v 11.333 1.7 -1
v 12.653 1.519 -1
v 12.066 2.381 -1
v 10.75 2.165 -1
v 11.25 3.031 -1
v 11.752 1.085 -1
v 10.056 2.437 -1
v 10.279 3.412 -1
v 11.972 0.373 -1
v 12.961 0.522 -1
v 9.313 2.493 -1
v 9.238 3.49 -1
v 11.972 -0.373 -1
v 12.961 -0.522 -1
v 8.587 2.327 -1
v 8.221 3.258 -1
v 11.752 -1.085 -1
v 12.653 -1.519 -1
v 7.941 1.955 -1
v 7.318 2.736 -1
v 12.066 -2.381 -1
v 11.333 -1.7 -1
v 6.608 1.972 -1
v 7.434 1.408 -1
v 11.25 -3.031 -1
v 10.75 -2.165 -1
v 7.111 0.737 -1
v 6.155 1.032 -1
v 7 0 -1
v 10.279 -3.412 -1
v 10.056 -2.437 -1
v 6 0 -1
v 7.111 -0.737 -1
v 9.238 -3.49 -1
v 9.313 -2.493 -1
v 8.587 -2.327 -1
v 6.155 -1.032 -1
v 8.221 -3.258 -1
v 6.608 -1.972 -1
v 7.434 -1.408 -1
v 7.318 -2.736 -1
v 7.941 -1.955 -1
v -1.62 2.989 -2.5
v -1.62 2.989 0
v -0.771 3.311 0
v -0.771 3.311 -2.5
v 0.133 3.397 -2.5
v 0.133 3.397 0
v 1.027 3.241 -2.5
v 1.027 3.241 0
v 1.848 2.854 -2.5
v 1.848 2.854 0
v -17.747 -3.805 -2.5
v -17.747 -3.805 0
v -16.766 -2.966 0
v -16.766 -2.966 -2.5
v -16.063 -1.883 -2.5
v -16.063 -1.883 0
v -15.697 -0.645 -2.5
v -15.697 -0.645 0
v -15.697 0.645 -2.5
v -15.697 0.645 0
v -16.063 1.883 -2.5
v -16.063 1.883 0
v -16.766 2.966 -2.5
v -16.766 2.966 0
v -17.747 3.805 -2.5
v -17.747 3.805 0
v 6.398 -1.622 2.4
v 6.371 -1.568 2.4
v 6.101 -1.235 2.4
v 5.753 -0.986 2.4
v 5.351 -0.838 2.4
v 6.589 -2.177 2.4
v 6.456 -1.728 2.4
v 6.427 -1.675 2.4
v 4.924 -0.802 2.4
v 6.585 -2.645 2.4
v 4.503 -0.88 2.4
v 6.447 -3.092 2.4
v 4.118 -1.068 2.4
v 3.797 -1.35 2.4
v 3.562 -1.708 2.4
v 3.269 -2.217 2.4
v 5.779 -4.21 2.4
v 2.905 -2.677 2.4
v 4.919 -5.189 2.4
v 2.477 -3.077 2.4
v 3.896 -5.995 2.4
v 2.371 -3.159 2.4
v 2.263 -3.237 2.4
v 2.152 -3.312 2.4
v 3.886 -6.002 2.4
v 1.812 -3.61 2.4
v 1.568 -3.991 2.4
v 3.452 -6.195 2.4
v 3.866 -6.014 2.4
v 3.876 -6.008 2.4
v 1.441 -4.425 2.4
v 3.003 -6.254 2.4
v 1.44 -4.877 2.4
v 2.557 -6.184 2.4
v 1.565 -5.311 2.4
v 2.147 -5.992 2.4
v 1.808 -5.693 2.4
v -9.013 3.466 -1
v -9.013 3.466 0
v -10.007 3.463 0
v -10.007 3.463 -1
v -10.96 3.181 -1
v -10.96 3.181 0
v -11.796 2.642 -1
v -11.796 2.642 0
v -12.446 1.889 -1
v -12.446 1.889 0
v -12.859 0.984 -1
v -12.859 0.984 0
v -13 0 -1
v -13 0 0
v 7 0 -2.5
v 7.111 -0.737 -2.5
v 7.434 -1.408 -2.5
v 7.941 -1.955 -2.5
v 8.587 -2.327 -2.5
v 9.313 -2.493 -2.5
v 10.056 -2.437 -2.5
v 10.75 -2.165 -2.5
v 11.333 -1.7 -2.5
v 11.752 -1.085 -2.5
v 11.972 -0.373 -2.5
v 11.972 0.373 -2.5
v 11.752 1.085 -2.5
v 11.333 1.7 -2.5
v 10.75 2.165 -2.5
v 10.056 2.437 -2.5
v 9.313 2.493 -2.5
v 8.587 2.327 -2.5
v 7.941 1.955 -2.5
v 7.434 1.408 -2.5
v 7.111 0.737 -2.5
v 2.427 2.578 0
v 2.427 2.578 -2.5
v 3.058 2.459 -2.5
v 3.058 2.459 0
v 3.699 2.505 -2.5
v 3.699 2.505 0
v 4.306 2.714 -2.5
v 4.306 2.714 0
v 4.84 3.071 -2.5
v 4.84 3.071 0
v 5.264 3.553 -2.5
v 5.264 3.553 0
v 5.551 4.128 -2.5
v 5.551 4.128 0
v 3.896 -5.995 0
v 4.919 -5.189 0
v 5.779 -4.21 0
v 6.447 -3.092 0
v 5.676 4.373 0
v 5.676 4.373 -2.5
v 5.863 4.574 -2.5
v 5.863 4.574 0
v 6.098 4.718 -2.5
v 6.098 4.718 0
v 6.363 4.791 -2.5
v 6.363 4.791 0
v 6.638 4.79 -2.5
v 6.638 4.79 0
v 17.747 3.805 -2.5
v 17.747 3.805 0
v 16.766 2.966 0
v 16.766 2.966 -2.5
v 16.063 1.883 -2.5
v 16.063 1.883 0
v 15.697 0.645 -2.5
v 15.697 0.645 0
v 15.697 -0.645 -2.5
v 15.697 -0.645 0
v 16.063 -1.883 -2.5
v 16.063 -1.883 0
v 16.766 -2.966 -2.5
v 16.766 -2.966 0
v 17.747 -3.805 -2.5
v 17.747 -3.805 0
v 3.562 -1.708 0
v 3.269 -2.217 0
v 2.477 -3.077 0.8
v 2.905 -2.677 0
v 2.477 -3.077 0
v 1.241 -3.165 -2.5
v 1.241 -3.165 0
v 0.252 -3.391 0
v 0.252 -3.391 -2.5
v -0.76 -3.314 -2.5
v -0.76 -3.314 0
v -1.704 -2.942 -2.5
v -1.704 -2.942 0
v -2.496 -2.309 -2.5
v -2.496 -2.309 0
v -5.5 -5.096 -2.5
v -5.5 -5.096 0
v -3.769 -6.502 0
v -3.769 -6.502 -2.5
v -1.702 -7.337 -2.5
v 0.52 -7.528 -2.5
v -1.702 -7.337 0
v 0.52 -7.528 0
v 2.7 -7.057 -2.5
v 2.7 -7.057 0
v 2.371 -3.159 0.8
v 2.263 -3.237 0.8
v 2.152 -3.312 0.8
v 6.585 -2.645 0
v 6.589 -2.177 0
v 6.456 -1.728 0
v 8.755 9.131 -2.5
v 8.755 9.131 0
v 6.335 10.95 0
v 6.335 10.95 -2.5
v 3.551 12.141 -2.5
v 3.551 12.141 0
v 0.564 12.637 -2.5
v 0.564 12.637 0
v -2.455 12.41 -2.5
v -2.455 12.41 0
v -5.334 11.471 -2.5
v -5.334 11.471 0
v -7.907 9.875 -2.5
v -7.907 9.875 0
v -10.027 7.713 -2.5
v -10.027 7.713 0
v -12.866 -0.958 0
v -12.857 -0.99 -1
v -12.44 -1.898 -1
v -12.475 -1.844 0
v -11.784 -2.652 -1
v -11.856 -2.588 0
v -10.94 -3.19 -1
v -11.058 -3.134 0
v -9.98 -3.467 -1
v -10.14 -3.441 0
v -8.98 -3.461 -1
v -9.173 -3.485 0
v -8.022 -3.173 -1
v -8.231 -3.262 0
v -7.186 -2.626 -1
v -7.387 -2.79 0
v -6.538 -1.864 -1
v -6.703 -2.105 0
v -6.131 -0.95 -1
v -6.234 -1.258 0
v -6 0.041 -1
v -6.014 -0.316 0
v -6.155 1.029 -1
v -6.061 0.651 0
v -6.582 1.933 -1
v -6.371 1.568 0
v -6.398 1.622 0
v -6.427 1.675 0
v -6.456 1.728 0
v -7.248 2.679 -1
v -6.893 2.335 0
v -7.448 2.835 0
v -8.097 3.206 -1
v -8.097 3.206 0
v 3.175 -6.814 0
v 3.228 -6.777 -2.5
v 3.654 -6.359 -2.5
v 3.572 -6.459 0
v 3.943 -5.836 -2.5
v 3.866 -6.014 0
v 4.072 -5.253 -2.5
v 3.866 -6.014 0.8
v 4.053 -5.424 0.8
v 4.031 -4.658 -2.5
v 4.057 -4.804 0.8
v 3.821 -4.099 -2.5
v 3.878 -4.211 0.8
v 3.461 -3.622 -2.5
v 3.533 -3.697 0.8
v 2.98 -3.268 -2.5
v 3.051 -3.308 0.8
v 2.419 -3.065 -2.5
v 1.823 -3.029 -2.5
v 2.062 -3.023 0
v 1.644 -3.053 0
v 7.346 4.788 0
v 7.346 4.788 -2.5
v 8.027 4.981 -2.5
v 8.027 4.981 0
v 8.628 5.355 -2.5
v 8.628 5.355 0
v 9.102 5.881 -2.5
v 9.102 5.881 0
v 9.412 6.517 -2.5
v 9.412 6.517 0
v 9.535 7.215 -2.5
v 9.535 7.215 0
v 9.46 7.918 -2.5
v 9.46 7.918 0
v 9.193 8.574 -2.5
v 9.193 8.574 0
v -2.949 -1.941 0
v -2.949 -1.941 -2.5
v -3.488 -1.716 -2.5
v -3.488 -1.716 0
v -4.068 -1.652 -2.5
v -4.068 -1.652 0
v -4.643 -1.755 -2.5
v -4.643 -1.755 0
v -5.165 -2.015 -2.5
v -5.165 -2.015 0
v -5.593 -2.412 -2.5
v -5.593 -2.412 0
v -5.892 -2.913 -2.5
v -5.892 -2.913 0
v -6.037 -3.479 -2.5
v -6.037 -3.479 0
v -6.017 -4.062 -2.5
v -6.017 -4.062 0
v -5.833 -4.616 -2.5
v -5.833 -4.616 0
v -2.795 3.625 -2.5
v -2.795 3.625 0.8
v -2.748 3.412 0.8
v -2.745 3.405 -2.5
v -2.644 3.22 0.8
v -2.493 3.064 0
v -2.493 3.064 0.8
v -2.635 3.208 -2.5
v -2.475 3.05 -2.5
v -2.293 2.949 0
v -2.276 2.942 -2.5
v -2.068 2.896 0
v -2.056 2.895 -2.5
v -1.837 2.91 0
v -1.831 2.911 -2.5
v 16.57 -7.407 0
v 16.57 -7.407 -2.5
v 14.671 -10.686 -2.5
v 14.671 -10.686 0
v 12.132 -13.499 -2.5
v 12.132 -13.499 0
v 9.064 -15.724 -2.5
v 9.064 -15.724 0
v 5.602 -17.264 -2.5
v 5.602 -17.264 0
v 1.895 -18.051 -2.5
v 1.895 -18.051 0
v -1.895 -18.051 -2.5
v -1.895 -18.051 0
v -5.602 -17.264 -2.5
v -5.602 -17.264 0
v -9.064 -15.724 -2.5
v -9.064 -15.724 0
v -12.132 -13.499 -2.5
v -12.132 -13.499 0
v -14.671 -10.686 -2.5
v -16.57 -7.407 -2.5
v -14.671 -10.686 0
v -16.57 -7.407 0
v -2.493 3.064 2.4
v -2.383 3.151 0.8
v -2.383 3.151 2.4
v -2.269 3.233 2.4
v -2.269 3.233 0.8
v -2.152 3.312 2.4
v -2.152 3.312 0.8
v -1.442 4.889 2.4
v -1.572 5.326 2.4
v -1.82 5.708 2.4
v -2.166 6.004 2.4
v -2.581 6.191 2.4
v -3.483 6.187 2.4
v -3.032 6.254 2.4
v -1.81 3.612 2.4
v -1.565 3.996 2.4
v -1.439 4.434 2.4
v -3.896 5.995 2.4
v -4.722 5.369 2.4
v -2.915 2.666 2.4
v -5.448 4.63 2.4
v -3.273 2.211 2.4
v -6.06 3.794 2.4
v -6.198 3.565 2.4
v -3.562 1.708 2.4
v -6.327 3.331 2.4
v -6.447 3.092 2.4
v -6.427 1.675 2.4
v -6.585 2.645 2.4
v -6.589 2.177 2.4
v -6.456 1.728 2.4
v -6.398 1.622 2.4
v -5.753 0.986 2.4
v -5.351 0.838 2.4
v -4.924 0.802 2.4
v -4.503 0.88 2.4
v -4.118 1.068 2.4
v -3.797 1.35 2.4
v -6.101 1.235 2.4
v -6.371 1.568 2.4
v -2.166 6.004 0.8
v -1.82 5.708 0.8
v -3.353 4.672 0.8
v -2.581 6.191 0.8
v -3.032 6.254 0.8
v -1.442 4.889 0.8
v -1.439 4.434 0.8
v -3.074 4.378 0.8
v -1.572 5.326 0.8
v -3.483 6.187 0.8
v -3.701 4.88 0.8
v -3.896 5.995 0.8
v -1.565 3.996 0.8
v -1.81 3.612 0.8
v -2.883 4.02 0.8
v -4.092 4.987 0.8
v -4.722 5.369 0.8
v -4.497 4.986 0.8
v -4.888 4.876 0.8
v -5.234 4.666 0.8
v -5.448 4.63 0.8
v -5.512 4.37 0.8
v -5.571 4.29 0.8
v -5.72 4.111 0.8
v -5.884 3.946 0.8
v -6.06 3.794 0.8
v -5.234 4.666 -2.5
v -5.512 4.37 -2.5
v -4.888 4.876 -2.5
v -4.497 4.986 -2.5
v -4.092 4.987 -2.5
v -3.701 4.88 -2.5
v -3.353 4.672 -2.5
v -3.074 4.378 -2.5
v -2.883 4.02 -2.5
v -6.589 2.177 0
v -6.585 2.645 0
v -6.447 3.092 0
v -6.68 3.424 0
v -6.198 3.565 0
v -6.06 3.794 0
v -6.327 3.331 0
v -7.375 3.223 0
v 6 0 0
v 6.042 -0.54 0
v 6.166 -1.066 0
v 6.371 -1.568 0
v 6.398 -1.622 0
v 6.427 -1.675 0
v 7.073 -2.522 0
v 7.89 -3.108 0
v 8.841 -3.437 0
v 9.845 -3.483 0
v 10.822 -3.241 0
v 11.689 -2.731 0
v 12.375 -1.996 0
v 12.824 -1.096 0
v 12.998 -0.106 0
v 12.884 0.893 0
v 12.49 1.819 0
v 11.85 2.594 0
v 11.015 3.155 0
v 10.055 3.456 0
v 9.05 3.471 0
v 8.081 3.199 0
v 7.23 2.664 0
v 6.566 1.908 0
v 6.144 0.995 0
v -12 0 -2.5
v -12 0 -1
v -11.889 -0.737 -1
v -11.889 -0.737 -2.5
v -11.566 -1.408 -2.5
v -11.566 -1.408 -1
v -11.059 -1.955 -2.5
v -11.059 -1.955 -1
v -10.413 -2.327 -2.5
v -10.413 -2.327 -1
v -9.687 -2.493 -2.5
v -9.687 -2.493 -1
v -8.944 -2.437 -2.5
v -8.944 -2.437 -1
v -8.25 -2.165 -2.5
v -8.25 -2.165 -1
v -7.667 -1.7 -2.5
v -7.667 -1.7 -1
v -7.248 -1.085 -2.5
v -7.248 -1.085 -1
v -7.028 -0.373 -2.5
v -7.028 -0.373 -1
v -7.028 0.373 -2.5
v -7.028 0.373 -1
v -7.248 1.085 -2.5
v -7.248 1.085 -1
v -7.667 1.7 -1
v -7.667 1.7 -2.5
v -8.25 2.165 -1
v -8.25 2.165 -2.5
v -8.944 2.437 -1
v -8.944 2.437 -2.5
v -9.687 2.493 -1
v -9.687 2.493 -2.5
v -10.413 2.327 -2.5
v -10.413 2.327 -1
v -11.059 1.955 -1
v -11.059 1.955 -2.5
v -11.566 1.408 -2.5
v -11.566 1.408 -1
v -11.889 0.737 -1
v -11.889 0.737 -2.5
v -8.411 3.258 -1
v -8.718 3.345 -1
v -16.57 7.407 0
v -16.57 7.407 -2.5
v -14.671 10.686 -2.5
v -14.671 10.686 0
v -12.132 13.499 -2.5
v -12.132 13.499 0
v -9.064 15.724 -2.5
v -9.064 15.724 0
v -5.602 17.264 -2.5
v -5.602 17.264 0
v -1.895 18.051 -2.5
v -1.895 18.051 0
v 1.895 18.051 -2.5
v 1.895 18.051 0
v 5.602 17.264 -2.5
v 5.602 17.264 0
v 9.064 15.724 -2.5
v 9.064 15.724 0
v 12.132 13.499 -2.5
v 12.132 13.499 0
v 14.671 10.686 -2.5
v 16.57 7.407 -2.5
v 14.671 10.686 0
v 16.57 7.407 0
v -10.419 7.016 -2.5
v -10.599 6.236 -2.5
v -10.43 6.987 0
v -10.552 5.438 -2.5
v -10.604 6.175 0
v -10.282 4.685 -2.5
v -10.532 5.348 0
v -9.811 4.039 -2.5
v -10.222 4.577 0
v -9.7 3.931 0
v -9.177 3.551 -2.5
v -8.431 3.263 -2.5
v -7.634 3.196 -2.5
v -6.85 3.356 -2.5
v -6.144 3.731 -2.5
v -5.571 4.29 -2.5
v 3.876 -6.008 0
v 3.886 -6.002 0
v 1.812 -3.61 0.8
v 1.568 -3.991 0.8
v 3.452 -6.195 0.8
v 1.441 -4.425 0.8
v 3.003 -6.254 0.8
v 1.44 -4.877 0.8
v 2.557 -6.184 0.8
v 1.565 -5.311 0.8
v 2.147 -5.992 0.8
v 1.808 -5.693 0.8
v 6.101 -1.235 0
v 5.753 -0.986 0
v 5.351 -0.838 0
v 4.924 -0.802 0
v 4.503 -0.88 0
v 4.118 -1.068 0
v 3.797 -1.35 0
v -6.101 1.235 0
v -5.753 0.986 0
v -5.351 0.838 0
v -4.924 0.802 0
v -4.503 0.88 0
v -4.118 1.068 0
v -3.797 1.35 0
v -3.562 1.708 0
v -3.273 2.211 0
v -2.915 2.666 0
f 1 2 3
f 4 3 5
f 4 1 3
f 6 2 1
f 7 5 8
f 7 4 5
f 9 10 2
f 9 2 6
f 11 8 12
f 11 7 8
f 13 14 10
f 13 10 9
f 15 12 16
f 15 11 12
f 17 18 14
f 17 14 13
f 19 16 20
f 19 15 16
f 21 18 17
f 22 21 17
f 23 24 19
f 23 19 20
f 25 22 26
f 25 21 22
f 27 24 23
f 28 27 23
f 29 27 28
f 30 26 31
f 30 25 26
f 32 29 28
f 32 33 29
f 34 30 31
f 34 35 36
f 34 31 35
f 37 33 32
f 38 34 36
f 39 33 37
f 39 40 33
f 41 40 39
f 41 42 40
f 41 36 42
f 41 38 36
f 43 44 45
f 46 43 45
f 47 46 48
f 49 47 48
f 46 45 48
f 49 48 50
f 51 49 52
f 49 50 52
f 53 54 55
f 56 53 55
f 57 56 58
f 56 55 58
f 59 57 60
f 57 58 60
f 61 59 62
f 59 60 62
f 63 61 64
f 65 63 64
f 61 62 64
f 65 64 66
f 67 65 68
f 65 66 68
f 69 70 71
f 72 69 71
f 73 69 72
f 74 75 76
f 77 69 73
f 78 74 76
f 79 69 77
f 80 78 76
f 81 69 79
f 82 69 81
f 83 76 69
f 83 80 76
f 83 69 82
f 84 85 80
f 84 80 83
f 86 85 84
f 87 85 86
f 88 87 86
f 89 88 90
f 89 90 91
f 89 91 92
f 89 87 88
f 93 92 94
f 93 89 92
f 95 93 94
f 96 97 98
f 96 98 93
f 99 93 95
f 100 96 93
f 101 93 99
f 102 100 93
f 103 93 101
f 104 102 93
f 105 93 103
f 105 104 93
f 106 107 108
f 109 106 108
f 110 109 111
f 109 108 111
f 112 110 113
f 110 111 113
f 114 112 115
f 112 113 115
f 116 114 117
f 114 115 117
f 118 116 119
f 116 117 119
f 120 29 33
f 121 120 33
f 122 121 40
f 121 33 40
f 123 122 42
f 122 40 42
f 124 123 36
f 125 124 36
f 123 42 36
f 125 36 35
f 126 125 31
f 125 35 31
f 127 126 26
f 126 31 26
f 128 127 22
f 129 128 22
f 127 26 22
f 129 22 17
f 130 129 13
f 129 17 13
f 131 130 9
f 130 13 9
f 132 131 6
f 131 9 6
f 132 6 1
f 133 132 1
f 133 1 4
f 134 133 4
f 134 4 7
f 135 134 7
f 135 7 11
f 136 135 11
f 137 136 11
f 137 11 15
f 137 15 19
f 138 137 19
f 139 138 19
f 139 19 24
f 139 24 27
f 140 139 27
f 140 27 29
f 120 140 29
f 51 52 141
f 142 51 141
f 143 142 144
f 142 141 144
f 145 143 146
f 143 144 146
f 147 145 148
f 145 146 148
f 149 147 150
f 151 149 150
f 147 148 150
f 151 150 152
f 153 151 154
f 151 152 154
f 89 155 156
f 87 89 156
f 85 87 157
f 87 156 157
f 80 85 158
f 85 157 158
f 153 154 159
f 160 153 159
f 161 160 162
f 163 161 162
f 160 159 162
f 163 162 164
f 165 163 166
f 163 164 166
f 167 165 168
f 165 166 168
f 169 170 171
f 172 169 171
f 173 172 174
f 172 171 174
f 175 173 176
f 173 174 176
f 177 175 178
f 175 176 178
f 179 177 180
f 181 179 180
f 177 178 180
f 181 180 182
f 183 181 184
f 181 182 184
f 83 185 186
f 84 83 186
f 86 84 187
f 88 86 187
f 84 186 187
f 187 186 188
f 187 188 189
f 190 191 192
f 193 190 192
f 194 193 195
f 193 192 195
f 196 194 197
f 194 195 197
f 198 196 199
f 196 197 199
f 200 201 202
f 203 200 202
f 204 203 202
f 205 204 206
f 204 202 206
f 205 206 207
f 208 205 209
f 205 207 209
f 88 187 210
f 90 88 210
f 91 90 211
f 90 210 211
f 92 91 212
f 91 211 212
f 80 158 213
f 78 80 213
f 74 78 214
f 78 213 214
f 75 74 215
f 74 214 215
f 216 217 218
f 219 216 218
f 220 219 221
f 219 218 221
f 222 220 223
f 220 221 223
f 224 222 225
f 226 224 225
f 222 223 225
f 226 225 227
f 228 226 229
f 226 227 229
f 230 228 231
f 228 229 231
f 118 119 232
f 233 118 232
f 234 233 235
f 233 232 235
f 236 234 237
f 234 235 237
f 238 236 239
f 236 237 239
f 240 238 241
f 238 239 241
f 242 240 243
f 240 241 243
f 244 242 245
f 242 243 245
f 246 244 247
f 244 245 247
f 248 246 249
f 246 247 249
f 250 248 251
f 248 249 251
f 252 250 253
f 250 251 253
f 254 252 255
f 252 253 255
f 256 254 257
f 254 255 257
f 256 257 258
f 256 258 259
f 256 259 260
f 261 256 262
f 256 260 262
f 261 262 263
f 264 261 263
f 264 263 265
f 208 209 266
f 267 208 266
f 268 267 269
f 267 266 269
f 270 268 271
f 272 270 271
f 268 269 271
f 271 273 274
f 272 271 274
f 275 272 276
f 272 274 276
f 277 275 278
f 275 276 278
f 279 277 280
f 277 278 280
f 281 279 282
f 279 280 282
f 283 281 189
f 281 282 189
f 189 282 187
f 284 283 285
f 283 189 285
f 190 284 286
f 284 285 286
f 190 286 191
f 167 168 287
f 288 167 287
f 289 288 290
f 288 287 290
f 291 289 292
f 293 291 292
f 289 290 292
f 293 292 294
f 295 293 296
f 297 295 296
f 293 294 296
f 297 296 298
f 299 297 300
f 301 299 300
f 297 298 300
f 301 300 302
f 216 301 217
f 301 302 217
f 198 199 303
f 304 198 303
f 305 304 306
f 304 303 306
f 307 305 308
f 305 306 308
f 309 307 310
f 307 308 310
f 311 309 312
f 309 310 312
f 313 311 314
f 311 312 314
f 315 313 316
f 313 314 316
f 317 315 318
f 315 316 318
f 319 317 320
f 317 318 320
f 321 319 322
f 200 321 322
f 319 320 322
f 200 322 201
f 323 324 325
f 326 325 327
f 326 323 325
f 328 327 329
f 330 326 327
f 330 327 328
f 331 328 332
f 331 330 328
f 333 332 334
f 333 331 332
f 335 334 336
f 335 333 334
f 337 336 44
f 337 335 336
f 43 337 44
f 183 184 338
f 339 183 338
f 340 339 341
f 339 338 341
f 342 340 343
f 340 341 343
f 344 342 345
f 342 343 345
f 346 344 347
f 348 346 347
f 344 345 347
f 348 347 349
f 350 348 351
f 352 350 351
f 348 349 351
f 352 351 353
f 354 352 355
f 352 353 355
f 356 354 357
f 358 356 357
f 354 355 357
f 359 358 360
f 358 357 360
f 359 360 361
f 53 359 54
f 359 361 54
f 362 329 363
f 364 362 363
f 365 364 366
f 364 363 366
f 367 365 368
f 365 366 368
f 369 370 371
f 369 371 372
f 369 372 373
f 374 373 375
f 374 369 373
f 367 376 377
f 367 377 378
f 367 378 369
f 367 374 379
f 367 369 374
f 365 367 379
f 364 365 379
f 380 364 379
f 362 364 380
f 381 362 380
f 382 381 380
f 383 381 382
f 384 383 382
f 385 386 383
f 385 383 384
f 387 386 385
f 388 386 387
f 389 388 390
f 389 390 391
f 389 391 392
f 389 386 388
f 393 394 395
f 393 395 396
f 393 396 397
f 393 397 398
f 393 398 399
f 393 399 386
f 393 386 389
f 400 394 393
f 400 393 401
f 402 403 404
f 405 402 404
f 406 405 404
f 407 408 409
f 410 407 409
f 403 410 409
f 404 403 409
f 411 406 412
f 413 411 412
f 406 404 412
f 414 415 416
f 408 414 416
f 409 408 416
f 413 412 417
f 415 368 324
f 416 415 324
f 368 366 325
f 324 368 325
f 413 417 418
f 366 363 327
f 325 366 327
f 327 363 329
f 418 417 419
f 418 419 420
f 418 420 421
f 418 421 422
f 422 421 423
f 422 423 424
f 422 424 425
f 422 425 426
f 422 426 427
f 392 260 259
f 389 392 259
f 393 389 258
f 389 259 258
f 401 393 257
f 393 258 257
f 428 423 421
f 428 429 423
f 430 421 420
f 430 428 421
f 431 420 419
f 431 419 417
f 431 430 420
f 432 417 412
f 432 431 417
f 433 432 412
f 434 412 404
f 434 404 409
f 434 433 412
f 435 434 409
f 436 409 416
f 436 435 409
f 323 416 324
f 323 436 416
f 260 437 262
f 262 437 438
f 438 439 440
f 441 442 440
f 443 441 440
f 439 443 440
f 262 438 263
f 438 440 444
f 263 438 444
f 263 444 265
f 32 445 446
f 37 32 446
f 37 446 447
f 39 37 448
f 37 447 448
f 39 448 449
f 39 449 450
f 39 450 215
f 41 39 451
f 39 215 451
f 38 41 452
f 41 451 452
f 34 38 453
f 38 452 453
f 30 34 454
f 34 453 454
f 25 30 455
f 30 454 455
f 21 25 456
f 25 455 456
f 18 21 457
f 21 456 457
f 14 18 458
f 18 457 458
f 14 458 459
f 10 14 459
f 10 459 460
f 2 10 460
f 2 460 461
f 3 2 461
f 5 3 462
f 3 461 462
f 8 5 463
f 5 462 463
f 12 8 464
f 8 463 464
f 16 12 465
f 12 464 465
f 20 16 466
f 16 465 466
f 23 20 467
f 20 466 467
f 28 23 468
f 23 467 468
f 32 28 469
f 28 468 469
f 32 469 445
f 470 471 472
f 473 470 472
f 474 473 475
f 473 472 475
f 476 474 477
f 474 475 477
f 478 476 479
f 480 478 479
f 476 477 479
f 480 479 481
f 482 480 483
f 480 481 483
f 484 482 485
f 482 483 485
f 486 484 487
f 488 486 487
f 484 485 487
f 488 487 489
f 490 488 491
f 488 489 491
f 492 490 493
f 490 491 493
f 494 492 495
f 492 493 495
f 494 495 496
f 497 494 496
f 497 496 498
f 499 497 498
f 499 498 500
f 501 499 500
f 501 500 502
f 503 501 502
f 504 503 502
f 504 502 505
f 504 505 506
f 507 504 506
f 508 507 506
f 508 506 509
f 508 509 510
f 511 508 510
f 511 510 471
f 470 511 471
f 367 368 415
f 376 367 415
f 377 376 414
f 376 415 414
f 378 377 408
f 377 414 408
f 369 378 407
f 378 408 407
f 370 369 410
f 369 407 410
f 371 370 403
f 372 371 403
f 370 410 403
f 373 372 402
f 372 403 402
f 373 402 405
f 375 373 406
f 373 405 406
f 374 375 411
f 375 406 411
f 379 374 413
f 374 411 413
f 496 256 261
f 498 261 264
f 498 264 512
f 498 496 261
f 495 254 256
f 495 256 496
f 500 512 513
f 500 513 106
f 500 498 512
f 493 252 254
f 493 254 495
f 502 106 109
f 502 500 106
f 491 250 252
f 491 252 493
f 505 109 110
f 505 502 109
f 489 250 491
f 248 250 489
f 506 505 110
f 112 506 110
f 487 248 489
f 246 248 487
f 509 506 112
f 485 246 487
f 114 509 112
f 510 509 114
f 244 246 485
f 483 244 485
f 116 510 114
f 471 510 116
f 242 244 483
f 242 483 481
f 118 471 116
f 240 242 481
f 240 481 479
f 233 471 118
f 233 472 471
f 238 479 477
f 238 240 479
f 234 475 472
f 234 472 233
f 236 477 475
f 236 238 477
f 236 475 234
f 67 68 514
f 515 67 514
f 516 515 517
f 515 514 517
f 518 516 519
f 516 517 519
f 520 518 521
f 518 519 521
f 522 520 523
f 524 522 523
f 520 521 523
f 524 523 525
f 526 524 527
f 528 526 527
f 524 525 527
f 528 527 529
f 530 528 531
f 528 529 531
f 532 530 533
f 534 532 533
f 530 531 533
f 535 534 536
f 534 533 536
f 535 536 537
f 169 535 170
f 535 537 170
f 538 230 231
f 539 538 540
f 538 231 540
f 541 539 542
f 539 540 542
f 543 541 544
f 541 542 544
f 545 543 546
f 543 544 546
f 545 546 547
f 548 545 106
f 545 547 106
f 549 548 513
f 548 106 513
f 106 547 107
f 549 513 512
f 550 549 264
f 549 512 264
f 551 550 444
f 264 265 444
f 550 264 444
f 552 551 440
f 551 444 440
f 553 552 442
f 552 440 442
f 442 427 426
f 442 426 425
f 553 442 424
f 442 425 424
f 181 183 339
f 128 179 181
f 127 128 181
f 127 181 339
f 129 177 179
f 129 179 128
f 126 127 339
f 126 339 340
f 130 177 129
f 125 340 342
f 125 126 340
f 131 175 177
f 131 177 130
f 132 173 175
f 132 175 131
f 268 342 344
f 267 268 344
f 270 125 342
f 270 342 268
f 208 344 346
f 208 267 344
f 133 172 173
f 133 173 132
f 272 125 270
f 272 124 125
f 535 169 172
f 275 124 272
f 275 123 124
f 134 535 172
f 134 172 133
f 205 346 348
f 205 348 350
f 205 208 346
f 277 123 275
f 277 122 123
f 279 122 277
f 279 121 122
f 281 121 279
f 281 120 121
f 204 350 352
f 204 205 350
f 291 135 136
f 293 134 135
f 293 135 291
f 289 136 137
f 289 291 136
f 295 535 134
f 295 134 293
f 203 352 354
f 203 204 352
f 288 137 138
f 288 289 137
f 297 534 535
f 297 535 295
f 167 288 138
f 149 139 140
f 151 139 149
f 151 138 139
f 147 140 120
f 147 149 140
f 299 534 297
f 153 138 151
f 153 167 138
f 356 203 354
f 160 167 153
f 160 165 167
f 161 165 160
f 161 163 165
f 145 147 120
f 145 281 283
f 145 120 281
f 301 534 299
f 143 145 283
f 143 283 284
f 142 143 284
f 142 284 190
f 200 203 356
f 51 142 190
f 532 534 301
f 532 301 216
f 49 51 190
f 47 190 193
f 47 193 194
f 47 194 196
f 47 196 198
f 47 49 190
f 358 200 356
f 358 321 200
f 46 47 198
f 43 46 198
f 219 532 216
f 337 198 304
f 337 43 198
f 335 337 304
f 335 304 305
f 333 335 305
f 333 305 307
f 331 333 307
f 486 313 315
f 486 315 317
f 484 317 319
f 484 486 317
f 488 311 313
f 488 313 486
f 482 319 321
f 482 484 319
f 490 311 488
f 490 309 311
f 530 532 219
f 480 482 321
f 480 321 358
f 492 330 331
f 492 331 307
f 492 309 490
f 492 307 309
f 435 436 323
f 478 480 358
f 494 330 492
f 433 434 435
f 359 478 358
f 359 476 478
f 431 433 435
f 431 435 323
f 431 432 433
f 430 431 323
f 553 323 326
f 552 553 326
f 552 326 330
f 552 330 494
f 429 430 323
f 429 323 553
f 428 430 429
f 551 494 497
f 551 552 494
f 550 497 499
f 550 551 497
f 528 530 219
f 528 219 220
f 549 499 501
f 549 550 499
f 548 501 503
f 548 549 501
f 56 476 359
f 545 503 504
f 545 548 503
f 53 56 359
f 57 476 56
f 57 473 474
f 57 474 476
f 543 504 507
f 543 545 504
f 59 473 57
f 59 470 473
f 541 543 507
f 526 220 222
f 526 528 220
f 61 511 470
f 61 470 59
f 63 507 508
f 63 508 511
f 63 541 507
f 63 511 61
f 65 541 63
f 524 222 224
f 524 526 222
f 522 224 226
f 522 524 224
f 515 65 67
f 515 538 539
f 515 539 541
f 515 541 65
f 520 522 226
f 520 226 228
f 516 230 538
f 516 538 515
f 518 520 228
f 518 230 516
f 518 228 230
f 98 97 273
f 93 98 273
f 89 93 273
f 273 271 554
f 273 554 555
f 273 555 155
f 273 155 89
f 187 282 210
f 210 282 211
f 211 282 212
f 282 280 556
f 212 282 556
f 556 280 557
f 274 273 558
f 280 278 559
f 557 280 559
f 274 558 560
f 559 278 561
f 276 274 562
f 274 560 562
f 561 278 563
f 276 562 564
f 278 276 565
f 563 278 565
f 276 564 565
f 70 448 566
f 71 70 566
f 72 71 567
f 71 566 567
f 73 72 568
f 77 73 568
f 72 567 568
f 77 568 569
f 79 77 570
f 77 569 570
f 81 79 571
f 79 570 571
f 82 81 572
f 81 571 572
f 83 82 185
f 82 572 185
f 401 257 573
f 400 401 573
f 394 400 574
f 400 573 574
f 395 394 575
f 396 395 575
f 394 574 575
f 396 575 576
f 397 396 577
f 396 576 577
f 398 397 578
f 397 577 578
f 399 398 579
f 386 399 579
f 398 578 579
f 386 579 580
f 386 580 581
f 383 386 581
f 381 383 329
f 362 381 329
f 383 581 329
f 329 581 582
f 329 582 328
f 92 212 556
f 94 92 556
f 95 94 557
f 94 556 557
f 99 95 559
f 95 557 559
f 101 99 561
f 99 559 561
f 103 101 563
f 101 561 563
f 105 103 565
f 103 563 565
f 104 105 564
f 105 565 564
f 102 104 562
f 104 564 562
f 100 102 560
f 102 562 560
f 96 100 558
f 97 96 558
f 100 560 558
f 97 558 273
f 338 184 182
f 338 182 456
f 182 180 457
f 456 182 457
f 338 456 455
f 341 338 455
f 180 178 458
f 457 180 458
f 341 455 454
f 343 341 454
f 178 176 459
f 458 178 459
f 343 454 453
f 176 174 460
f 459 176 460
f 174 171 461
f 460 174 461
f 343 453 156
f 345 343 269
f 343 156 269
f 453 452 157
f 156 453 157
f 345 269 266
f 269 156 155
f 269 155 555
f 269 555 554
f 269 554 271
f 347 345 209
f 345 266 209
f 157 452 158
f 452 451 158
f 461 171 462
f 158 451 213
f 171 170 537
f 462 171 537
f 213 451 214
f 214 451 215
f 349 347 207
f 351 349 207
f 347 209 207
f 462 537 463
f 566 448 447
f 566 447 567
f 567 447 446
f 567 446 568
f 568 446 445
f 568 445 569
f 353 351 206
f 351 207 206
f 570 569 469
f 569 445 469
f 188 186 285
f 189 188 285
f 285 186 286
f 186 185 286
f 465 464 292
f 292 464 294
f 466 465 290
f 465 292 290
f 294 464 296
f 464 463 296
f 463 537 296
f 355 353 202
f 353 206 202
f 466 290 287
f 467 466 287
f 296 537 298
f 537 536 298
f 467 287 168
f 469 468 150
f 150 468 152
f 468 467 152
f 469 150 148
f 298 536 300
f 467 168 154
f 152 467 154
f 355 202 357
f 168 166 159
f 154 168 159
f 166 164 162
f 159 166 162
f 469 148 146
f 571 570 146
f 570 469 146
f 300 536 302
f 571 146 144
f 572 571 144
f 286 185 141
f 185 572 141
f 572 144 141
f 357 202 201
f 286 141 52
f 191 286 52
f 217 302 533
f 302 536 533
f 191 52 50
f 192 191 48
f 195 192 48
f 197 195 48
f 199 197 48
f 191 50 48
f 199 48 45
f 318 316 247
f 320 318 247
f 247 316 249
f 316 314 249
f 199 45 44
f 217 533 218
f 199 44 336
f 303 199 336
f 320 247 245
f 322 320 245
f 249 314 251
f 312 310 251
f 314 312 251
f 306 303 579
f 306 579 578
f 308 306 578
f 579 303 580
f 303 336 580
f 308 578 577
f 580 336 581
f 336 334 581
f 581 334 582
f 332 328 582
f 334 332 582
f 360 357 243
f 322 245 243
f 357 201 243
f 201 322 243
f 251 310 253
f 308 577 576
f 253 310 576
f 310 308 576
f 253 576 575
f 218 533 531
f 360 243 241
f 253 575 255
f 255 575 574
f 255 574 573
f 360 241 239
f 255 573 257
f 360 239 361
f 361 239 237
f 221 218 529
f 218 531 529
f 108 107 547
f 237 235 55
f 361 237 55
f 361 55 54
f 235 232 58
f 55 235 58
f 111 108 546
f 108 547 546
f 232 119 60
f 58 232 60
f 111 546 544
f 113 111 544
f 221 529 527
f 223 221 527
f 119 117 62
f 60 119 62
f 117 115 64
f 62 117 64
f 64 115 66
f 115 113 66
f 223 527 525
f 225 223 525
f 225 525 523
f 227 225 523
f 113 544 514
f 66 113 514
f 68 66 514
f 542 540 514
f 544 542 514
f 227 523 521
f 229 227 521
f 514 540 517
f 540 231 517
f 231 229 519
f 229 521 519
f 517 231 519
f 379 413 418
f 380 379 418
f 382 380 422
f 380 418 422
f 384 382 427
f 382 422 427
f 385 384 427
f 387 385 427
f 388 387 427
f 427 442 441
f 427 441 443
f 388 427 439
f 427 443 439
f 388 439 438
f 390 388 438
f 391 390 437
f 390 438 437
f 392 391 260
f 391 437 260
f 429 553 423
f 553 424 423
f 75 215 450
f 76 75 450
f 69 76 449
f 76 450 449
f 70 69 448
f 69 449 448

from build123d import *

# Parameters (mm, degrees)
F1_DEPTH = 2.5
F2_R     = 2.5
F2_R_2   = 3.5
F3_DEPTH = 1
F4_DEPTH = 25
F6_DEPTH = 2.4
F7_DEPTH = 0.8
F8_ANGLE = 180


with BuildPart() as f1:
    # F0 (on Top) → F1 (new body)
    with BuildSketch(Plane.XY):
        with BuildLine():
            ThreePointArc((-17.7467741935, 3.8045375176), (-15.65, 0), (-17.7467741935, -3.8045375176))
            ThreePointArc((-17.7467741935, -3.8045375176), (0, -18.15), (17.7467741935, -3.8045375176))
            ThreePointArc((17.7467741935, -3.8045375176), (15.65, 0), (17.7467741935, 3.8045375176))
            ThreePointArc((17.7467741935, 3.8045375176), (0, 18.15), (-17.7467741935, 3.8045375176))
        make_face()
        with BuildLine():
            ThreePointArc((2.4959380946, -2.3087427375), (5.3934479575, -2.1979674519), (5.5, -5.0956356923))
            ThreePointArc((5.5, -5.0956356923), (1.7016498657, -7.3374880505), (-2.7, -7.0566959612))
            ThreePointArc((-2.7, -7.0566959612), (-3.9459149151, -4.3705658168), (-1.241297598, -3.1653088749))
            ThreePointArc((-1.241297598, -3.1653088749), (0.7595769091, -3.3140674283), (2.4959380946, -2.3087427375))
        make_face(mode=Mode.SUBTRACT)
        with BuildLine():
            ThreePointArc((-8.7553190403, 9.1305469991), (0.952140072, 12.6141162704), (10.0266934622, 7.7128411247))
            ThreePointArc((10.0266934622, 7.7128411247), (9.5115151335, 3.7722871727), (5.5712685972, 4.2898114644))
            Line((5.5712685972, 4.2898114644), (5.5118136083, 4.3702173366))
            ThreePointArc((5.5118136083, 4.3702173366), (3.8930445069, 4.946510168), (2.7952312611, 3.6246429626))
            ThreePointArc((2.7952312611, 3.6246429626), (2.3794320778, 2.9889401783), (1.6198224227, 2.9893436268))
            ThreePointArc((1.6198224227, 2.9893436268), (-0.1325337371, 3.3974159016), (-1.8477750037, 2.8540720972))
            ThreePointArc((-1.8477750037, 2.8540720972), (-4.009187674, 2.5898113989), (-5.5508583046, 4.1275988078))
            ThreePointArc((-5.5508583046, 4.1275988078), (-5.9755788699, 4.654107591), (-6.6382950389, 4.7897775457))
            ThreePointArc((-6.6382950389, 4.7897775457), (-9.2794977325, 6.1882728138), (-8.7553190403, 9.1305469991))
        make_face(mode=Mode.SUBTRACT)
    extrude(amount=F1_DEPTH)

    # F2 (on face) → F3 (cut)
    with BuildSketch(Plane(origin=(0, 0, 0), x_dir=(1, 0, 0), z_dir=(0, 0, -1))):
        with BuildLine():
            ThreePointArc((9.0125481144, -3.4658895913), (11.7960747375, -2.6415981526), (13, 0))
            ThreePointArc((13, 0), (7.5843636972, 2.9292213224), (8.0969499684, -3.2064701166))
            ThreePointArc((8.0969499684, -3.2064701166), (8.5658137707, -3.297127868), (9.0125481144, -3.4658895913))
        make_face()
        with Locations((9.5, 0)):
            Circle(F2_R, mode=Mode.SUBTRACT)
        with Locations((-9.5, 0)):
            Circle(F2_R_2)
        with Locations((-9.5, 0)):
            Circle(F2_R, mode=Mode.SUBTRACT)
    extrude(amount=-F3_DEPTH, mode=Mode.SUBTRACT)

    # F2 (on face) → F4 (cut)
    with BuildSketch(Plane(origin=(0, 0, 0), x_dir=(1, 0, 0), z_dir=(0, 0, -1))):
        with Locations((9.5, 0)):
            Circle(F2_R)
        with Locations((-9.5, 0)):
            Circle(F2_R)
    extrude(amount=-F4_DEPTH, mode=Mode.SUBTRACT)

    # F5 (on face) → F6 (join)
    with BuildSketch(Plane(origin=(0, 0, 0), x_dir=(1, 0, 0), z_dir=(0, 0, -1))):
        with BuildLine():
            ThreePointArc((6.0601535804, -3.7943429711), (6.2633893685, -3.4485436953), (6.4469143417, -3.0918918919))
            ThreePointArc((6.4469143417, -3.0918918919), (6.6042114466, -2.4108440907), (6.4561602608, -1.7277267266))
            ThreePointArc((6.4561602608, -1.7277267266), (6.4124110495, -1.6482701455), (6.3707355238, -1.5677065536))
            ThreePointArc((6.3707355238, -1.5677065536), (4.9243798524, -0.8019946659), (3.5615820489, -1.7081081081))
            ThreePointArc((3.5615820489, -1.7081081081), (3.1023693948, -2.4449548335), (2.4932688314, -3.0636759839))
            ThreePointArc((2.4932688314, -3.0636759839), (2.7026586012, -3.3127187828), (2.7952312611, -3.6246429626))
            ThreePointArc((2.7952312611, -3.6246429626), (3.8930445069, -4.946510168), (5.5118136083, -4.3702173366))
            Line((5.5118136083, -4.3702173366), (5.5712685972, -4.2898114644))
            ThreePointArc((5.5712685972, -4.2898114644), (5.8003063385, -4.0268771571), (6.0601535804, -3.7943429711))
        make_face()
        with BuildLine():
            ThreePointArc((3.8959765845, -5.9953203795), (5.0982553244, -5.0130123326), (6.0601535804, -3.7943429711))
            ThreePointArc((6.0601535804, -3.7943429711), (5.8003063385, -4.0268771571), (5.5712685972, -4.2898114644))
            Line((5.5712685972, -4.2898114644), (5.5118136083, -4.3702173366))
            ThreePointArc((5.5118136083, -4.3702173366), (3.8930445069, -4.946510168), (2.7952312611, -3.6246429626))
            ThreePointArc((2.7952312611, -3.6246429626), (2.7026586012, -3.3127187828), (2.4932688314, -3.0636759839))
            ThreePointArc((2.4932688314, -3.0636759839), (2.3261145429, -3.192442816), (2.1523227285, -3.3121000698))
            ThreePointArc((2.1523227285, -3.3121000698), (1.6825395016, -5.5255371527), (3.8959765845, -5.9953203795))
        make_face()
        with BuildLine():
            ThreePointArc((-3.8662701246, 6.0141635011), (-3.8811751433, 6.0048235859), (-3.8959765845, 5.9953203795))
            ThreePointArc((-3.8959765845, 5.9953203795), (-5.3713427021, 4.7192348508), (-6.4469143417, 3.0918918919))
            ThreePointArc((-6.4469143417, 3.0918918919), (-6.6042114466, 2.4108440907), (-6.4561602608, 1.7277267266))
            ThreePointArc((-6.4561602608, 1.7277267266), (-6.4124110495, 1.6482701455), (-6.3707355238, 1.5677065536))
            ThreePointArc((-6.3707355238, 1.5677065536), (-4.9243798524, 0.8019946659), (-3.5615820489, 1.7081081081))
            ThreePointArc((-3.5615820489, 1.7081081081), (-3.0956887113, 2.4534081198), (-2.4765181166, 3.0772322009))
            ThreePointArc((-2.4765181166, 3.0772322009), (-3.8784449822, 4.2111223181), (-3.8662701246, 6.0141635011))
        make_face()
        with BuildLine():
            ThreePointArc((-2.1523227285, 3.3121000698), (-1.6730362952, 5.5107357114), (-3.8662701246, 6.0141635011))
            ThreePointArc((-3.8662701246, 6.0141635011), (-3.8784449822, 4.2111223181), (-2.4765181166, 3.0772322009))
            ThreePointArc((-2.4765181166, 3.0772322009), (-2.3173978125, 3.1987759188), (-2.1523227285, 3.3121000698))
        make_face()
    extrude(amount=F6_DEPTH)

    # F7 (cut): faces of the model
    f7_faces = [f1.faces().sort_by_distance(p)[0] for p in [
        (2.880203055, 4.9455389585, 0),
        (-2.7641546482, -4.7635377555, 0),
    ]]
    extrude(f7_faces, amount=-F7_DEPTH, mode=Mode.SUBTRACT)


with BuildPart() as f1_1:
    # F8: moved
    add(f1.part.rotate(Axis((0, 0, 0), (0, -1, 0)), F8_ANGLE))


solid = f1_1.part
